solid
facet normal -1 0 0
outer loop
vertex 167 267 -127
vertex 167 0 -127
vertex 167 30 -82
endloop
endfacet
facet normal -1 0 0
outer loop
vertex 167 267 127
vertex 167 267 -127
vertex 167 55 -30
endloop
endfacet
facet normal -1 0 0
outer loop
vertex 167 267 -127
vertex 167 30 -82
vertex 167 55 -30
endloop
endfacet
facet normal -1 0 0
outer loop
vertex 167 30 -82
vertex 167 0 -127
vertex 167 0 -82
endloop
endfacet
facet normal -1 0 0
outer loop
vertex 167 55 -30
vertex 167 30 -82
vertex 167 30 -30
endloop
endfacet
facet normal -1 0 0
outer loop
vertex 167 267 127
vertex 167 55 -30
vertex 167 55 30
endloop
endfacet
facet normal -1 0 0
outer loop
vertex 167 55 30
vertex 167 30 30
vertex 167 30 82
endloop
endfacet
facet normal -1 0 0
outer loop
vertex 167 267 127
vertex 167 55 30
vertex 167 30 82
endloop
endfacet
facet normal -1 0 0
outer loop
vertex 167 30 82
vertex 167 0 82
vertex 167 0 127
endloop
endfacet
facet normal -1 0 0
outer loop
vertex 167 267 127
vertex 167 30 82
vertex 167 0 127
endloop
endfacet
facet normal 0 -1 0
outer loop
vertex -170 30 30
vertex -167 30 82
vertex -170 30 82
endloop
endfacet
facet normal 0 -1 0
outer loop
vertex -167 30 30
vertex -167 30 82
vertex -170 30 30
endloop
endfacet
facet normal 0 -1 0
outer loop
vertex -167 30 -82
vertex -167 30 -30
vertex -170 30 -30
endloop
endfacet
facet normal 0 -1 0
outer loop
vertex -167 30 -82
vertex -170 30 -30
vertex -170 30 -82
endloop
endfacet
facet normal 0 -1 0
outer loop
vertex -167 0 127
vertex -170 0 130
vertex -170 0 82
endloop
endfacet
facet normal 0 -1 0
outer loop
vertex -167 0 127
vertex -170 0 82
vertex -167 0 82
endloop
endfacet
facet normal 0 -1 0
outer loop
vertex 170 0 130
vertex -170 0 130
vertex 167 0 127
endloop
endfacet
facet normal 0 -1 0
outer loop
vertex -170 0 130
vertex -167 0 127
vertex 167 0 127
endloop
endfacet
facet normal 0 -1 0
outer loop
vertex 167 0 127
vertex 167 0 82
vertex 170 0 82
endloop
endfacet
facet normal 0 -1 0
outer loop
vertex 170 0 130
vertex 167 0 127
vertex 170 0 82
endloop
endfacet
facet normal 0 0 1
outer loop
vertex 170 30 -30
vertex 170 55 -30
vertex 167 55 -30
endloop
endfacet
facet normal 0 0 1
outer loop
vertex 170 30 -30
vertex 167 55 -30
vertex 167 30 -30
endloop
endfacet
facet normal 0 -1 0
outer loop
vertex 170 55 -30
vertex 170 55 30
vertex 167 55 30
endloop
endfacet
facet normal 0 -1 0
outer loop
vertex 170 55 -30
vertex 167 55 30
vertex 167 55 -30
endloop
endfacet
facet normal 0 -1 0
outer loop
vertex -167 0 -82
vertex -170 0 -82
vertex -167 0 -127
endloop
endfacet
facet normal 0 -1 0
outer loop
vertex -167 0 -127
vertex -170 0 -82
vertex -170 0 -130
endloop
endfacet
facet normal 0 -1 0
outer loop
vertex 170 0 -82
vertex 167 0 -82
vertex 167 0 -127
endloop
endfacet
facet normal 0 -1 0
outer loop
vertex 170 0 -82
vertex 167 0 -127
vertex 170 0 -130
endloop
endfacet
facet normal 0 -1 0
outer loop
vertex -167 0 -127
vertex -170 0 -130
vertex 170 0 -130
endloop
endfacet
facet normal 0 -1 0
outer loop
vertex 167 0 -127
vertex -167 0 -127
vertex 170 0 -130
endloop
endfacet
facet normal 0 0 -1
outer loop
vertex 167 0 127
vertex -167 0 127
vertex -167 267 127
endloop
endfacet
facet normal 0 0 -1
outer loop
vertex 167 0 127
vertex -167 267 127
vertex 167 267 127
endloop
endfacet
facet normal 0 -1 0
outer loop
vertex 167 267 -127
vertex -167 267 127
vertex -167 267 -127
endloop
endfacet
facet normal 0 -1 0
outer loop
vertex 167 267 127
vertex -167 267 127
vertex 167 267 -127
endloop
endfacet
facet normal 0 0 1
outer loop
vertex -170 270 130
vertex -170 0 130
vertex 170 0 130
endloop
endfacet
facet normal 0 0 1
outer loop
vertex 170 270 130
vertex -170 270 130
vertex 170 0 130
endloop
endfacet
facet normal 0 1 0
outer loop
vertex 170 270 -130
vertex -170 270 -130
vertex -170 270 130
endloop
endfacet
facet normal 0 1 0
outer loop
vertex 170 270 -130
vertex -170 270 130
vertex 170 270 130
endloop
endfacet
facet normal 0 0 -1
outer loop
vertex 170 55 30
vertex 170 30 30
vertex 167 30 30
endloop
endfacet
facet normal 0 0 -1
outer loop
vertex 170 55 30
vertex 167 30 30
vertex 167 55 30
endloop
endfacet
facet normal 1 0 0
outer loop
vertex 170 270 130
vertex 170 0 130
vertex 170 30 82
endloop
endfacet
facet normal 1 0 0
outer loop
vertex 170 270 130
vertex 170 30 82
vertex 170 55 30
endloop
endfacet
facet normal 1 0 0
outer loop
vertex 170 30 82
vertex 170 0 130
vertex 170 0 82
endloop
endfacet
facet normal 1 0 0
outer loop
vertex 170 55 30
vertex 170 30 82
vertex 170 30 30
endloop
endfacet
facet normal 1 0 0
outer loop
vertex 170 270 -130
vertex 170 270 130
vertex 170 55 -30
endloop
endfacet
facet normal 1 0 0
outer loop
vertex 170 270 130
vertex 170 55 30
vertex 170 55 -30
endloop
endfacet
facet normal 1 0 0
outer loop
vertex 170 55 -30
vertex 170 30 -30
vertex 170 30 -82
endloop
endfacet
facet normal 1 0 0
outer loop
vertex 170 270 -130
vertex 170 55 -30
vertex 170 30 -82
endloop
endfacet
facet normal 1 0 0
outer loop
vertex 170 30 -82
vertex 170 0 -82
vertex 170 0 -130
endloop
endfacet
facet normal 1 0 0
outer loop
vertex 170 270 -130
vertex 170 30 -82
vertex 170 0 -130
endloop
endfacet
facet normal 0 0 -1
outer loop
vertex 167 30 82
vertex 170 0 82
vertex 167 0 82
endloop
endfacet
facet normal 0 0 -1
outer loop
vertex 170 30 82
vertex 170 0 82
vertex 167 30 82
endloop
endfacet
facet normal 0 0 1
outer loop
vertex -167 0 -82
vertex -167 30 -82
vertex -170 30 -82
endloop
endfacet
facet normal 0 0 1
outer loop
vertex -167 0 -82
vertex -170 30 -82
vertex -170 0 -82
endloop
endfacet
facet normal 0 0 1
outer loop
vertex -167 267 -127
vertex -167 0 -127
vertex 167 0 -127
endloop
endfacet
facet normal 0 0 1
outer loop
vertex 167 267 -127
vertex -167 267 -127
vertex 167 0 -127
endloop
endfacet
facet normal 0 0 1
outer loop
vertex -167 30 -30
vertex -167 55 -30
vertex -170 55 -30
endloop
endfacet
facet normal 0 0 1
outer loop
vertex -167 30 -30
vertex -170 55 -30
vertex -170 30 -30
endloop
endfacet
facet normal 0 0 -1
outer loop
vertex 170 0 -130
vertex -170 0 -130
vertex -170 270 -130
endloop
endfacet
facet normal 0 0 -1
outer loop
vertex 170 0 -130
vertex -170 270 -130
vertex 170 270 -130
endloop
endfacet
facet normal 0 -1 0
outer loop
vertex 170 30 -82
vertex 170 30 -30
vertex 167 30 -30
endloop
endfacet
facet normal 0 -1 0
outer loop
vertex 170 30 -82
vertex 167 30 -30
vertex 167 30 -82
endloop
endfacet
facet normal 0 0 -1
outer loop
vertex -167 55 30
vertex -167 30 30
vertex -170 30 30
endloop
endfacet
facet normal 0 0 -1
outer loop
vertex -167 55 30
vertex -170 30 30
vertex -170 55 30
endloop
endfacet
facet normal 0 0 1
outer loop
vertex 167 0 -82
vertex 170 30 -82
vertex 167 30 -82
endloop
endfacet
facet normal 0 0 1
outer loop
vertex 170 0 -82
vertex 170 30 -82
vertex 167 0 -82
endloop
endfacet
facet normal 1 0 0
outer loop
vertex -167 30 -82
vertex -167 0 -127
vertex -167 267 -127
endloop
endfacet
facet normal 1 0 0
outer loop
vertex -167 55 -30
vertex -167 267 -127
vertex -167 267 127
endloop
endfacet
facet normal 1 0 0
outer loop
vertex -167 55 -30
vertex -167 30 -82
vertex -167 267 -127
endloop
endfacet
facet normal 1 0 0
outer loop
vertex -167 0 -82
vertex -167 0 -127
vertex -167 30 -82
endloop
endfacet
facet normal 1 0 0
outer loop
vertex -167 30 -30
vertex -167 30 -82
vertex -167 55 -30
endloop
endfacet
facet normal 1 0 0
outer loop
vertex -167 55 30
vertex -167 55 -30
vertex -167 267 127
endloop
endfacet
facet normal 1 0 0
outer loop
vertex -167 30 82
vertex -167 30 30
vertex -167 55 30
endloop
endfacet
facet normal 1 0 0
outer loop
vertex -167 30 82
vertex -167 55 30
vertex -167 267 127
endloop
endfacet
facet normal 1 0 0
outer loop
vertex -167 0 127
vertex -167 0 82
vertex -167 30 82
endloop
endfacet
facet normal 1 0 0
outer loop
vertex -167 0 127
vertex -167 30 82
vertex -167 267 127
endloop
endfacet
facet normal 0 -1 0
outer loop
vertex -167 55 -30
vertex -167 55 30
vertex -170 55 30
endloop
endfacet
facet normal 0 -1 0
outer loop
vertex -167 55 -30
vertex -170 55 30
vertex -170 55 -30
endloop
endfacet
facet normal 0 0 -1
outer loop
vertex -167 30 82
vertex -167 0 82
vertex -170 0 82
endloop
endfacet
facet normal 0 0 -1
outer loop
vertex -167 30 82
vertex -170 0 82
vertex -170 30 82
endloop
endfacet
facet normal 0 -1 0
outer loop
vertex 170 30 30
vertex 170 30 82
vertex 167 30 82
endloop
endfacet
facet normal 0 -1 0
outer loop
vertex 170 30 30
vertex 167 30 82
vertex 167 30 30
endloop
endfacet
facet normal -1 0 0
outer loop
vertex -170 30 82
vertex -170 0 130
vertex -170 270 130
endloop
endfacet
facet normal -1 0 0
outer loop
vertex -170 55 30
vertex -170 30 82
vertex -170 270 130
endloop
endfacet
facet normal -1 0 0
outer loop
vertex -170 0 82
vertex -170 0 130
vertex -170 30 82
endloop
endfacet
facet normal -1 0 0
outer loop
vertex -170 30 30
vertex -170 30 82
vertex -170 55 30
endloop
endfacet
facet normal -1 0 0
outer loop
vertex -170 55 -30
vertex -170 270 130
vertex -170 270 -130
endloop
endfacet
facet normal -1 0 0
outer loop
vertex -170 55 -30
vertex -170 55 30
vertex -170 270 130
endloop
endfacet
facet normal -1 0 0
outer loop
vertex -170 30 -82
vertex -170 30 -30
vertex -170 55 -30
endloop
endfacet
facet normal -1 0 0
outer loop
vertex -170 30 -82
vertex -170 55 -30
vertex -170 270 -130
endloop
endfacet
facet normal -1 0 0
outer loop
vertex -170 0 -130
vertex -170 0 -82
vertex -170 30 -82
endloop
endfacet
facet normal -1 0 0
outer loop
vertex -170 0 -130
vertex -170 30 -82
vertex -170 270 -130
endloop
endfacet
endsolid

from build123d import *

# Parameters (mm, degrees)
CROQUIS1_W              = 340
CROQUIS1_H              = 260
SALIENTE_EXTRUIR1_DEPTH = 270
CROQUIS2_W              = 334
CROQUIS2_H              = 254
CORTAR_EXTRUIR1_DEPTH   = 267
CORTAR_EXTRUIR2_DEPTH   = 341


with BuildPart() as part:
    # Croquis1 → Saliente-Extruir1 (new body)
    with BuildSketch(Plane(origin=(0, 0, 0), x_dir=(1, 0, 0), z_dir=(0, 1, 0))):
        Rectangle(CROQUIS1_W, CROQUIS1_H)
    extrude(amount=SALIENTE_EXTRUIR1_DEPTH)

    # Croquis2 → Cortar-Extruir1 (cut)
    with BuildSketch(Plane.XZ):
        Rectangle(CROQUIS2_W, CROQUIS2_H)
    extrude(amount=-CORTAR_EXTRUIR1_DEPTH, mode=Mode.SUBTRACT)

    # Croquis3 → Cortar-Extruir2 (cut, through all)
    with BuildSketch(Plane(origin=(170, 0, 0), x_dir=(0, 0, -1), z_dir=(1, 0, 0))):
        Polygon((0, 0), (-82, 0), (-82, 30), (-30, 30), (-30, 55), (30, 55), (30, 30), (82, 30), (82, 0), align=None)
    extrude(amount=-CORTAR_EXTRUIR2_DEPTH, mode=Mode.SUBTRACT)


solid = part.part
